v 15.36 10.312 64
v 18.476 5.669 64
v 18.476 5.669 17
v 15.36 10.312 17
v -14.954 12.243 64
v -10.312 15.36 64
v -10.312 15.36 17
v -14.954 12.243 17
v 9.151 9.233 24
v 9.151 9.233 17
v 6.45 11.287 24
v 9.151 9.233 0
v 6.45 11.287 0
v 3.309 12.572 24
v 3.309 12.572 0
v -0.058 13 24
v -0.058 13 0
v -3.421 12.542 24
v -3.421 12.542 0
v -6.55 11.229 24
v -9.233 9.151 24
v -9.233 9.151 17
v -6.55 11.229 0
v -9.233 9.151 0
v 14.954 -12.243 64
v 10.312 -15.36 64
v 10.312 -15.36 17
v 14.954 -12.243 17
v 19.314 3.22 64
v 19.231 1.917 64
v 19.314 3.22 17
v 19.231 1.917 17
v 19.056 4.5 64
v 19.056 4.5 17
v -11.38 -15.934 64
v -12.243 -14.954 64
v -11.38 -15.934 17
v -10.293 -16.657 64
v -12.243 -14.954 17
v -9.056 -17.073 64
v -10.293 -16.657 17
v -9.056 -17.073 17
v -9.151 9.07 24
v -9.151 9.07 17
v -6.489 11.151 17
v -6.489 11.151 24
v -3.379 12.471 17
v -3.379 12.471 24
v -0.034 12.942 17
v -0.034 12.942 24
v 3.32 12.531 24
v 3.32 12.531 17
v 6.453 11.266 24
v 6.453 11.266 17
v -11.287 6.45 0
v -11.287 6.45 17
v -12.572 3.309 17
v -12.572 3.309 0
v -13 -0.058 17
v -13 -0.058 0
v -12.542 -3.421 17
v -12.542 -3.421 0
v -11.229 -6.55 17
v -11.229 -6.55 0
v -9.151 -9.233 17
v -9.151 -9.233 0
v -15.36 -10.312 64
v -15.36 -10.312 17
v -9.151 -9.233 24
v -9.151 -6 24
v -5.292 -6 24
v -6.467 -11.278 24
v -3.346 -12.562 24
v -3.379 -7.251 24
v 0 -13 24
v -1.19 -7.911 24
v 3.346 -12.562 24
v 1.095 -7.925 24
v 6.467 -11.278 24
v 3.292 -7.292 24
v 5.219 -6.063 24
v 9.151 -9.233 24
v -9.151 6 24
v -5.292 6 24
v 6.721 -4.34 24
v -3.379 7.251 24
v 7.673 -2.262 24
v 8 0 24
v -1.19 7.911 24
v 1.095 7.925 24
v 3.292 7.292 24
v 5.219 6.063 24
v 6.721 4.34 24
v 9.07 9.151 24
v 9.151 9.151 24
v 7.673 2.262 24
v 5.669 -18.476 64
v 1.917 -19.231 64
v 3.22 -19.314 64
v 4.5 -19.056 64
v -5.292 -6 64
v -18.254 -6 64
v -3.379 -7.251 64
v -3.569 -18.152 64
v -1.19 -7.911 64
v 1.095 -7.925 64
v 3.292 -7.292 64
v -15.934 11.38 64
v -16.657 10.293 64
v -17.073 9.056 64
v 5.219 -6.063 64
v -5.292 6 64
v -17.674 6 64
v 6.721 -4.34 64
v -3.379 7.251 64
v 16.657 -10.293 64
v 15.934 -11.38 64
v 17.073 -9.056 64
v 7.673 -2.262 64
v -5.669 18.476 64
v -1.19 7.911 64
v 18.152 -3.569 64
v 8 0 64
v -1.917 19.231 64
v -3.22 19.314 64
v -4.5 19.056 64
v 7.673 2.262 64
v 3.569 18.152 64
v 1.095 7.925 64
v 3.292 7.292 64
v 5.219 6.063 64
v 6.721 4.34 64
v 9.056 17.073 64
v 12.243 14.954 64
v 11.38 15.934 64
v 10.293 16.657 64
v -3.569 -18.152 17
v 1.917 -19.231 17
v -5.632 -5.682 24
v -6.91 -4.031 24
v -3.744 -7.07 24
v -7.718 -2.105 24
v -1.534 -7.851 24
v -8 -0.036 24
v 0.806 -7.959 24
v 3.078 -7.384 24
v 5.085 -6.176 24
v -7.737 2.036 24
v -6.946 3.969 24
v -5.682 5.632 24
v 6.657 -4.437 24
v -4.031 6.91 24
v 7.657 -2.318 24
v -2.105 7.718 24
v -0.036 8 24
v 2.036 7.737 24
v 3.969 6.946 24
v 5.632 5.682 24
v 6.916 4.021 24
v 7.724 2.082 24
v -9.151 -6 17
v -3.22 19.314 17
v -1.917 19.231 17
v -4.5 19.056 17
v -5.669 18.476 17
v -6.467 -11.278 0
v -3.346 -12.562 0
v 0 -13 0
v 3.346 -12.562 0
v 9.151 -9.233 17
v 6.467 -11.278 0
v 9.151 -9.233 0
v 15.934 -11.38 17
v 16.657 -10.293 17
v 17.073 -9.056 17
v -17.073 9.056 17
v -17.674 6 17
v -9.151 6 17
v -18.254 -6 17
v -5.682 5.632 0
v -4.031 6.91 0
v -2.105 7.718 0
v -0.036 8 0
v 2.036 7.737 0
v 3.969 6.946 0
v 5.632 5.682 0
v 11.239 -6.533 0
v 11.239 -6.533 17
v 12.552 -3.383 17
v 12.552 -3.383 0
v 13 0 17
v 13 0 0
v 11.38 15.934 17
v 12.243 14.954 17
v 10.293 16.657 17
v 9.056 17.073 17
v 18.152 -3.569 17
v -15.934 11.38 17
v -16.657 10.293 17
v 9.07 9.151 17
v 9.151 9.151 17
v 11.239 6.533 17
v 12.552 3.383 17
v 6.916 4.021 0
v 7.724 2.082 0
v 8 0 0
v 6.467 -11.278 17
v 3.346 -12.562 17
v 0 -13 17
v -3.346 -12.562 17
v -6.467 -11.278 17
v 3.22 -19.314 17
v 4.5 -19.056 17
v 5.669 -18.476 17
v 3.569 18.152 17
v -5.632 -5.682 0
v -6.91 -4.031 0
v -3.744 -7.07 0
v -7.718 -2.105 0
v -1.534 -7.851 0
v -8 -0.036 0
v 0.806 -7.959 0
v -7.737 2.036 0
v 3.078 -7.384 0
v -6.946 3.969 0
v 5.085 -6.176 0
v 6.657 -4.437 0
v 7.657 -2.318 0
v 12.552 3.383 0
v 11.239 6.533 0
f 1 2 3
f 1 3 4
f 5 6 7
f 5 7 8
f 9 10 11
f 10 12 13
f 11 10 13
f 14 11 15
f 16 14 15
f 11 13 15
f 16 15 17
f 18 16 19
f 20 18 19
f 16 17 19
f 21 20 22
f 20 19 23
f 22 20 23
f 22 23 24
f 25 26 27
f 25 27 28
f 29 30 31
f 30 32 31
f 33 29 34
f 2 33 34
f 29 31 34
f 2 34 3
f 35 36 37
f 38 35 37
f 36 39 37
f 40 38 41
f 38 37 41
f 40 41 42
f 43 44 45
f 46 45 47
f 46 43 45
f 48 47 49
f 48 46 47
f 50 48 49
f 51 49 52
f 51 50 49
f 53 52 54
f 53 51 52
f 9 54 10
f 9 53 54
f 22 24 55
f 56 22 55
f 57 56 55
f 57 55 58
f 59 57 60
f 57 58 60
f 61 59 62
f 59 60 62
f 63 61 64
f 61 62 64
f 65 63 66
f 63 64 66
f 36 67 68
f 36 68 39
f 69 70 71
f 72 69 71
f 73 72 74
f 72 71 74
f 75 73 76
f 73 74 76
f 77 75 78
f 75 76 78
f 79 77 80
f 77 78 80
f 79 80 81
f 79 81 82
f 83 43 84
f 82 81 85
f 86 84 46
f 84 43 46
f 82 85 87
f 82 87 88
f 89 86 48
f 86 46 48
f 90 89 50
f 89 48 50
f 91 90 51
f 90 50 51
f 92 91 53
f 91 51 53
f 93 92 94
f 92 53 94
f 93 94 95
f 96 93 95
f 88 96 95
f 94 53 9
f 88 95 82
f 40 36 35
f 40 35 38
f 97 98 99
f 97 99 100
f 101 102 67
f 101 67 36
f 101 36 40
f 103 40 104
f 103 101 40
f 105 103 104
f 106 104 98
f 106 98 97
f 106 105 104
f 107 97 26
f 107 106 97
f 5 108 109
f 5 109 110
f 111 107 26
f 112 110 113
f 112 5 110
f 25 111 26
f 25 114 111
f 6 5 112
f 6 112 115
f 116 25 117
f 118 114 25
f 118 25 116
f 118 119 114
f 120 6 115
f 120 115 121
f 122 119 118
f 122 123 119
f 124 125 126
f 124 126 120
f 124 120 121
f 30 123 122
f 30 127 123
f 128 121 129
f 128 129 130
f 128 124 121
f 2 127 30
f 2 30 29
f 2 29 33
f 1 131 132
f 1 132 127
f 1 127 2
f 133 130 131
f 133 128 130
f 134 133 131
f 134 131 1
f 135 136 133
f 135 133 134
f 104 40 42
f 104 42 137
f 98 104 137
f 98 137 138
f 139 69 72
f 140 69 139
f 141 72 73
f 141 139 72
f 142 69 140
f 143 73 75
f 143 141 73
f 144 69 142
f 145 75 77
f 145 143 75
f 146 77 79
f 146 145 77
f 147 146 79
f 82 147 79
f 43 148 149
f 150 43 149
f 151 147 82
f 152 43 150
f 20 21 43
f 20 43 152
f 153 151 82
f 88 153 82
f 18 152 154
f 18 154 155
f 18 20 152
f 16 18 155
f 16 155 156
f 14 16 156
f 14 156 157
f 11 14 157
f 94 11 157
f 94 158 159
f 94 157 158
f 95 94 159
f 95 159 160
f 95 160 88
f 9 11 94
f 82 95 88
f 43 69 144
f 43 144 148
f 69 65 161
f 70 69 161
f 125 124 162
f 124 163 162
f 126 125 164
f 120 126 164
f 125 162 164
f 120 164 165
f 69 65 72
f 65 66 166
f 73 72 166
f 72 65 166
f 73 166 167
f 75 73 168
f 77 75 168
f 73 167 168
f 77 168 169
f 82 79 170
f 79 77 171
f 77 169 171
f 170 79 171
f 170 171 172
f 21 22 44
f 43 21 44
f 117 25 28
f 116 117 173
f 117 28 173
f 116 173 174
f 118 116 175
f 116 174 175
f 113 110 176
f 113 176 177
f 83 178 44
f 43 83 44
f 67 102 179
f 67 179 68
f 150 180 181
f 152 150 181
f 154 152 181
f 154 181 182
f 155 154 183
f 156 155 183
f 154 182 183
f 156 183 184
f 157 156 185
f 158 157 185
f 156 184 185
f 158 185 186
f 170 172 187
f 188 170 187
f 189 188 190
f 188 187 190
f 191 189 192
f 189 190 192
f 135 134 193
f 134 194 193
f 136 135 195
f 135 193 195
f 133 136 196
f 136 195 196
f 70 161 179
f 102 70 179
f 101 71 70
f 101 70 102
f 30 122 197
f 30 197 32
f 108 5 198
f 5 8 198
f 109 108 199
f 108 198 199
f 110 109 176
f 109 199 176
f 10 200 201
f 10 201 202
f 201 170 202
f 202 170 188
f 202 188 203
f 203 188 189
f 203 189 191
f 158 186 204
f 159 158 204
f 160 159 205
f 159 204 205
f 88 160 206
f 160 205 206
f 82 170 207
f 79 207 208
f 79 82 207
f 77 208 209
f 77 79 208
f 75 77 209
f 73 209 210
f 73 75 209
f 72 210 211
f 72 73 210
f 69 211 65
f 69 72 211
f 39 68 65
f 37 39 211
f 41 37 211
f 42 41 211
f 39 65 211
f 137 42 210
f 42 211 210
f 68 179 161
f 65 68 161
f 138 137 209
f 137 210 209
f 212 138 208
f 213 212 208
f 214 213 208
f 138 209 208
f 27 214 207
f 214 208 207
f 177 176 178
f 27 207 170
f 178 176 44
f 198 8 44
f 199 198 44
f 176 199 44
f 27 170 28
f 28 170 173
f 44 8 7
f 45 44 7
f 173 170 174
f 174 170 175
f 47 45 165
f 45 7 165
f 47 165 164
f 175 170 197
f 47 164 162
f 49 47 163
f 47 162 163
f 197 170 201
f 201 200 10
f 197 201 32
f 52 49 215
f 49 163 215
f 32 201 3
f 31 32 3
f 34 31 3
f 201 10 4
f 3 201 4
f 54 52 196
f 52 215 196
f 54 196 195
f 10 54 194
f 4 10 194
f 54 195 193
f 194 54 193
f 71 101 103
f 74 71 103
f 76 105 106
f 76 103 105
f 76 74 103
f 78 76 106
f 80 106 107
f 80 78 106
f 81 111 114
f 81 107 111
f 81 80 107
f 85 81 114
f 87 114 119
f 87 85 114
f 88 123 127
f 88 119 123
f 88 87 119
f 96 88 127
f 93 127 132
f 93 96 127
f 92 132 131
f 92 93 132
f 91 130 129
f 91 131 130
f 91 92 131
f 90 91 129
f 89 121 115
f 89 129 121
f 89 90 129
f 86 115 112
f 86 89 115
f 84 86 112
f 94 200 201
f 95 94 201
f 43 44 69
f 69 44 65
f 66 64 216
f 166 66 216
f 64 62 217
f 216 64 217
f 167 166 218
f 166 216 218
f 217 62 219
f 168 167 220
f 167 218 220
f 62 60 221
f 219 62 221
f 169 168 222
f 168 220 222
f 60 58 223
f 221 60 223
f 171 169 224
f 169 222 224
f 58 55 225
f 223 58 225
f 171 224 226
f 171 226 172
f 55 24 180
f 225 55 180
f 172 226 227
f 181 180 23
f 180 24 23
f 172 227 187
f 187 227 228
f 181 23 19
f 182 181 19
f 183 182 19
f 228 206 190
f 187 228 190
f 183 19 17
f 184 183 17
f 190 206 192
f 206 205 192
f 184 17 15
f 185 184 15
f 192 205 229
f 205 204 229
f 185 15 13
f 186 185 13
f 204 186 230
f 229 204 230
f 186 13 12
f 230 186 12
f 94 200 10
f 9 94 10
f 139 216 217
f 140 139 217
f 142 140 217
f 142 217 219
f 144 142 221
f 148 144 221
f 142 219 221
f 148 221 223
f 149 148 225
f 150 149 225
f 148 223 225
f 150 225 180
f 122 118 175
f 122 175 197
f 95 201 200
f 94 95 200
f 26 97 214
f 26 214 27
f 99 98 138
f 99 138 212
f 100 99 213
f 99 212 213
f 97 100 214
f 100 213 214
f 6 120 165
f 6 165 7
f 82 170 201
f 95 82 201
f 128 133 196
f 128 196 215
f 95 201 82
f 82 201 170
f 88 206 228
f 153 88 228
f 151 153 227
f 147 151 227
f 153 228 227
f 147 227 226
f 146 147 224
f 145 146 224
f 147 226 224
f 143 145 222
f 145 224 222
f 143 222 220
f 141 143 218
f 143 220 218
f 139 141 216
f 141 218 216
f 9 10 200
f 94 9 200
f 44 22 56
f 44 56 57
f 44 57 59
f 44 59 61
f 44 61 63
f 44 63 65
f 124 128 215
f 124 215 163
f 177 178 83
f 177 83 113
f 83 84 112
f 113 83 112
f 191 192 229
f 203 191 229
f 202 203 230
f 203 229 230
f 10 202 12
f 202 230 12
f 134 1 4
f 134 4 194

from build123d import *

# Parameters (mm, degrees)
F1_DEPTH  = 24
F2_DEPTH  = 17
F3_R      = 8
F4_DEPTH  = 40
F6_DEPTH  = 47
F8_DEPTH  = 47
F10_DEPTH = 47
F11_W     = 12
F11_H     = 90
F12_DEPTH = 25
F13_R     = 5


with BuildPart() as f1:
    # F0 (on Top) → F1 (new body)
    with BuildSketch(Plane.XY):
        with BuildLine():
            ThreePointArc((-9.1513157895, -9.2332778211), (0, -13), (9.1513157895, -9.2332778211))
            Line((9.1513157895, -9.2332778211), (-9.1513157895, -9.2332778211))
        make_face()
        with BuildLine():
            Line((-9.1513157895, -9.2332778211), (9.1513157895, -9.2332778211))
            Line((9.1513157895, -9.2332778211), (9.1513157895, 9.1513157895))
            Line((9.1513157895, 9.1513157895), (9.0700813191, 9.1513157895))
            Line((9.0700813191, 9.1513157895), (5.6315789474, 5.6820171207))
            ThreePointArc((5.6315789474, 5.6820171207), (7.3841936452, 3.0779350563), (8, 0))
            ThreePointArc((8, 0), (3.0779350563, -7.3841936452), (-5.6315789474, -5.6820171207))
            Line((-5.6315789474, -5.6820171207), (-9.1513157895, -9.2332778211))
        make_face()
        with BuildLine():
            Line((-9.1513157895, 9.0700813191), (-9.1513157895, -9.2332778211))
            Line((-9.1513157895, -9.2332778211), (-5.6315789474, -5.6820171207))
            ThreePointArc((-5.6315789474, -5.6820171207), (-7.9999204993, -0.0356651744), (-5.6820171207, 5.6315789474))
            Line((-5.6820171207, 5.6315789474), (-9.1513157895, 9.0700813191))
        make_face()
        with BuildLine():
            Line((5.6315789474, 5.6820171207), (9.0700813191, 9.1513157895))
            Line((9.0700813191, 9.1513157895), (-9.1513157895, 9.1513157895))
            Line((-9.1513157895, 9.1513157895), (-9.1513157895, 9.0700813191))
            Line((-9.1513157895, 9.0700813191), (-5.6820171207, 5.6315789474))
            ThreePointArc((-5.6820171207, 5.6315789474), (-0.0356651744, 7.9999204993), (5.6315789474, 5.6820171207))
        make_face()
        with BuildLine():
            Line((9.0700813191, 9.1513157895), (9.1513157895, 9.2332778211))
            ThreePointArc((9.1513157895, 9.2332778211), (-0.0579559084, 12.9998708114), (-9.2332778211, 9.1513157895))
            Line((-9.2332778211, 9.1513157895), (-9.1513157895, 9.0700813191))
            Line((-9.1513157895, 9.0700813191), (-9.1513157895, 9.1513157895))
            Line((-9.1513157895, 9.1513157895), (9.0700813191, 9.1513157895))
        make_face()
    extrude(amount=F1_DEPTH)

    # F0 (on Top) → F2 (join)
    with BuildSketch(Plane.XY):
        with BuildLine():
            ThreePointArc((9.1513157895, -9.2332778211), (11.9993146734, -5.0016444664), (13, 0))
            ThreePointArc((13, 0), (11.9993146734, 5.0016444664), (9.1513157895, 9.2332778211))
            Line((9.1513157895, 9.2332778211), (9.0700813191, 9.1513157895))
            Line((9.0700813191, 9.1513157895), (9.1513157895, 9.1513157895))
            Line((9.1513157895, 9.1513157895), (9.1513157895, -9.2332778211))
        make_face()
        with BuildLine():
            Line((9.0700813191, 9.1513157895), (9.1513157895, 9.2332778211))
            ThreePointArc((9.1513157895, 9.2332778211), (-0.0579559084, 12.9998708114), (-9.2332778211, 9.1513157895))
            Line((-9.2332778211, 9.1513157895), (-9.1513157895, 9.0700813191))
            Line((-9.1513157895, 9.0700813191), (-9.1513157895, 9.1513157895))
            Line((-9.1513157895, 9.1513157895), (9.0700813191, 9.1513157895))
        make_face()
        with BuildLine():
            ThreePointArc((-9.1513157895, -9.2332778211), (0, -13), (9.1513157895, -9.2332778211))
            Line((9.1513157895, -9.2332778211), (-9.1513157895, -9.2332778211))
        make_face()
        with BuildLine():
            Line((-9.1513157895, -9.2332778211), (9.1513157895, -9.2332778211))
            Line((9.1513157895, -9.2332778211), (9.1513157895, 9.1513157895))
            Line((9.1513157895, 9.1513157895), (9.0700813191, 9.1513157895))
            Line((9.0700813191, 9.1513157895), (5.6315789474, 5.6820171207))
            ThreePointArc((5.6315789474, 5.6820171207), (7.3841936452, 3.0779350563), (8, 0))
            ThreePointArc((8, 0), (3.0779350563, -7.3841936452), (-5.6315789474, -5.6820171207))
            Line((-5.6315789474, -5.6820171207), (-9.1513157895, -9.2332778211))
        make_face()
        with BuildLine():
            Line((-9.1513157895, 9.0700813191), (-9.2332778211, 9.1513157895))
            ThreePointArc((-9.2332778211, 9.1513157895), (-12.9998708114, -0.0579559084), (-9.1513157895, -9.2332778211))
            Line((-9.1513157895, -9.2332778211), (-9.1513157895, 9.0700813191))
        make_face()
        with BuildLine():
            Line((-9.1513157895, 9.0700813191), (-9.1513157895, -9.2332778211))
            Line((-9.1513157895, -9.2332778211), (-5.6315789474, -5.6820171207))
            ThreePointArc((-5.6315789474, -5.6820171207), (-7.9999204993, -0.0356651744), (-5.6820171207, 5.6315789474))
            Line((-5.6820171207, 5.6315789474), (-9.1513157895, 9.0700813191))
        make_face()
    extrude(amount=F2_DEPTH)


with BuildPart() as f4:
    # F3 (on face) → F4 (new body)
    with BuildSketch(Plane.XY.offset(24)):
        with BuildLine():
            Line((-9.1513157895, 9.0700813191), (-9.1513157895, -9.2332778211))
            ThreePointArc((-9.1513157895, -9.2332778211), (0, -13), (9.1513157895, -9.2332778211))
            Line((9.1513157895, -9.2332778211), (9.1513157895, 9.1513157895))
            Line((9.1513157895, 9.1513157895), (9.0700813191, 9.1513157895))
            Line((9.0700813191, 9.1513157895), (9.1513157895, 9.2332778211))
            ThreePointArc((9.1513157895, 9.2332778211), (-0.0337981522, 12.9421721373), (-9.1513157895, 9.0700813191))
        make_face()
        Circle(F3_R, mode=Mode.SUBTRACT)
    extrude(amount=F4_DEPTH)

    # F5 (on face) → F6 (join)
    with BuildSketch(Plane.XY.offset(17)):
        with BuildLine():
            Line((-9.1513157895, 9.0700813191), (-9.2332778211, 9.1513157895))
            ThreePointArc((-9.2332778211, 9.1513157895), (-12.9998708114, -0.0579559084), (-9.1513157895, -9.2332778211))
            Line((-9.1513157895, -9.2332778211), (-9.1513157895, 9.0700813191))
        make_face()
    extrude(amount=F6_DEPTH)

    # F7 (on face) → F8 (join)
    with BuildSketch(Plane.XY.offset(17)):
        with BuildLine():
            Line((9.0700813191, 9.1513157895), (9.1513157895, 9.1513157895))
            Line((9.1513157895, 9.1513157895), (9.1513157895, -9.2332778211))
            ThreePointArc((9.1513157895, -9.2332778211), (13, 0), (9.1513157895, 9.2332778211))
            Line((9.1513157895, 9.2332778211), (9.0700813191, 9.1513157895))
        make_face()
    extrude(amount=F8_DEPTH)

    # F9 (on face) → F10 (join)
    with BuildSketch(Plane.XY.offset(64)):
        with BuildLine():
            ThreePointArc((18.1523898541, -3.5694176815), (18.4128923896, -1.7931519315), (18.5, 0))
            ThreePointArc((18.5, 0), (17.6975039115, 5.3896526142), (15.3596372646, 10.3117187267))
            ThreePointArc((15.3596372646, 10.3117187267), (10.2443307659, 15.4046644611), (3.569417868, 18.1523898174))
            ThreePointArc((3.569417868, 18.1523898174), (-3.6489068915, 18.1365784672), (-10.3117186292, 15.3596373301))
            ThreePointArc((-10.3117186292, 15.3596373301), (-15.4046644936, 10.244330717), (-18.1523898628, 3.5694176374))
            ThreePointArc((-18.1523898628, 3.5694176374), (-18.1365784716, -3.6489068696), (-15.359637486, -10.311718397))
            ThreePointArc((-15.359637486, -10.311718397), (-10.2443309802, -15.4046643186), (-3.5694179833, -18.1523897947))
            ThreePointArc((-3.5694179833, -18.1523897947), (3.6489066832, -18.1365785091), (10.311718374, -15.3596375014))
            ThreePointArc((10.311718374, -15.3596375014), (15.4046643961, -10.2443308636), (18.1523898541, -3.5694176815))
        make_face()
        with BuildLine():
            ThreePointArc((-9.1513157895, 9.0700813191), (-0.0337981522, 12.9421721373), (9.1513157895, 9.2332778211))
            ThreePointArc((9.1513157895, 9.2332778211), (0.0579559084, -12.9998708114), (-9.2332778211, 9.1513157895))
            Line((-9.2332778211, 9.1513157895), (-9.1513157895, 9.0700813191))
        make_face(mode=Mode.SUBTRACT)
        with BuildLine():
            Line((3.949548491, -19.6308910463), (10.311718374, -15.3596375014))
            ThreePointArc((10.311718374, -15.3596375014), (3.6489066832, -18.1365785091), (-3.5694179833, -18.1523897947))
            Line((-3.5694179833, -18.1523897947), (3.949548491, -19.6308910463))
        make_face()
        with BuildLine():
            Line((-11.088383659, -16.6738887002), (-3.5694179833, -18.1523897947))
            ThreePointArc((-3.5694179833, -18.1523897947), (-10.2443309802, -15.4046643186), (-15.359637486, -10.311718397))
            Line((-15.359637486, -10.311718397), (-11.088383659, -16.6738887002))
        make_face()
        with BuildLine():
            ThreePointArc((-15.359637486, -10.311718397), (-18.1365784716, -3.6489068696), (-18.1523898628, 3.5694176374))
            Line((-18.1523898628, 3.5694176374), (-19.6308910463, -3.949548491))
            Line((-19.6308910463, -3.949548491), (-15.359637486, -10.311718397))
        make_face()
        with BuildLine():
            ThreePointArc((-18.1523898628, 3.5694176374), (-15.4046644936, 10.244330717), (-10.3117186292, 15.3596373301))
            Line((-10.3117186292, 15.3596373301), (-16.6738887002, 11.088383659))
            Line((-16.6738887002, 11.088383659), (-18.1523898628, 3.5694176374))
        make_face()
        with BuildLine():
            ThreePointArc((-10.3117186292, 15.3596373301), (-3.6489068915, 18.1365784672), (3.569417868, 18.1523898174))
            Line((3.569417868, 18.1523898174), (-3.949548491, 19.6308910463))
            Line((-3.949548491, 19.6308910463), (-10.3117186292, 15.3596373301))
        make_face()
        with BuildLine():
            ThreePointArc((3.569417868, 18.1523898174), (10.2443307659, 15.4046644611), (15.3596372646, 10.3117187267))
            Line((15.3596372646, 10.3117187267), (11.088383659, 16.6738887002))
            Line((11.088383659, 16.6738887002), (3.569417868, 18.1523898174))
        make_face()
        with BuildLine():
            ThreePointArc((15.3596372646, 10.3117187267), (17.6975039115, 5.3896526142), (18.5, 0))
            ThreePointArc((18.5, 0), (18.4128923896, -1.7931519315), (18.1523898541, -3.5694176815))
            Line((18.1523898541, -3.5694176815), (19.6308910463, 3.949548491))
            Line((19.6308910463, 3.949548491), (15.3596372646, 10.3117187267))
        make_face()
        with BuildLine():
            Line((16.6738887002, -11.088383659), (18.1523898541, -3.5694176815))
            ThreePointArc((18.1523898541, -3.5694176815), (15.4046643961, -10.2443308636), (10.311718374, -15.3596375014))
            Line((10.311718374, -15.3596375014), (16.6738887002, -11.088383659))
        make_face()
    extrude(amount=-F10_DEPTH)

    # F11 (on Right) → F12 (cut)
    with BuildSketch(Plane.YZ):
        with Locations((0, 45)):
            Rectangle(F11_W, F11_H)
    extrude(amount=-F12_DEPTH, mode=Mode.SUBTRACT)

    # F13
    f13_edges = [f4.edges().sort_by_distance(p)[0] for p in [
        (16.673889, -11.088384, 40.5),
        (3.949548, -19.630891, 40.5),
        (19.630891, 3.949548, 40.5),
        (11.088384, 16.673889, 40.5),
        (-3.949548, 19.630891, 40.5),
        (-16.673889, 11.088384, 40.5),
        (-11.088384, -16.673889, 40.5),
    ]]
    fillet(f13_edges, radius=F13_R)


solid = Compound([f1.part, f4.part])
